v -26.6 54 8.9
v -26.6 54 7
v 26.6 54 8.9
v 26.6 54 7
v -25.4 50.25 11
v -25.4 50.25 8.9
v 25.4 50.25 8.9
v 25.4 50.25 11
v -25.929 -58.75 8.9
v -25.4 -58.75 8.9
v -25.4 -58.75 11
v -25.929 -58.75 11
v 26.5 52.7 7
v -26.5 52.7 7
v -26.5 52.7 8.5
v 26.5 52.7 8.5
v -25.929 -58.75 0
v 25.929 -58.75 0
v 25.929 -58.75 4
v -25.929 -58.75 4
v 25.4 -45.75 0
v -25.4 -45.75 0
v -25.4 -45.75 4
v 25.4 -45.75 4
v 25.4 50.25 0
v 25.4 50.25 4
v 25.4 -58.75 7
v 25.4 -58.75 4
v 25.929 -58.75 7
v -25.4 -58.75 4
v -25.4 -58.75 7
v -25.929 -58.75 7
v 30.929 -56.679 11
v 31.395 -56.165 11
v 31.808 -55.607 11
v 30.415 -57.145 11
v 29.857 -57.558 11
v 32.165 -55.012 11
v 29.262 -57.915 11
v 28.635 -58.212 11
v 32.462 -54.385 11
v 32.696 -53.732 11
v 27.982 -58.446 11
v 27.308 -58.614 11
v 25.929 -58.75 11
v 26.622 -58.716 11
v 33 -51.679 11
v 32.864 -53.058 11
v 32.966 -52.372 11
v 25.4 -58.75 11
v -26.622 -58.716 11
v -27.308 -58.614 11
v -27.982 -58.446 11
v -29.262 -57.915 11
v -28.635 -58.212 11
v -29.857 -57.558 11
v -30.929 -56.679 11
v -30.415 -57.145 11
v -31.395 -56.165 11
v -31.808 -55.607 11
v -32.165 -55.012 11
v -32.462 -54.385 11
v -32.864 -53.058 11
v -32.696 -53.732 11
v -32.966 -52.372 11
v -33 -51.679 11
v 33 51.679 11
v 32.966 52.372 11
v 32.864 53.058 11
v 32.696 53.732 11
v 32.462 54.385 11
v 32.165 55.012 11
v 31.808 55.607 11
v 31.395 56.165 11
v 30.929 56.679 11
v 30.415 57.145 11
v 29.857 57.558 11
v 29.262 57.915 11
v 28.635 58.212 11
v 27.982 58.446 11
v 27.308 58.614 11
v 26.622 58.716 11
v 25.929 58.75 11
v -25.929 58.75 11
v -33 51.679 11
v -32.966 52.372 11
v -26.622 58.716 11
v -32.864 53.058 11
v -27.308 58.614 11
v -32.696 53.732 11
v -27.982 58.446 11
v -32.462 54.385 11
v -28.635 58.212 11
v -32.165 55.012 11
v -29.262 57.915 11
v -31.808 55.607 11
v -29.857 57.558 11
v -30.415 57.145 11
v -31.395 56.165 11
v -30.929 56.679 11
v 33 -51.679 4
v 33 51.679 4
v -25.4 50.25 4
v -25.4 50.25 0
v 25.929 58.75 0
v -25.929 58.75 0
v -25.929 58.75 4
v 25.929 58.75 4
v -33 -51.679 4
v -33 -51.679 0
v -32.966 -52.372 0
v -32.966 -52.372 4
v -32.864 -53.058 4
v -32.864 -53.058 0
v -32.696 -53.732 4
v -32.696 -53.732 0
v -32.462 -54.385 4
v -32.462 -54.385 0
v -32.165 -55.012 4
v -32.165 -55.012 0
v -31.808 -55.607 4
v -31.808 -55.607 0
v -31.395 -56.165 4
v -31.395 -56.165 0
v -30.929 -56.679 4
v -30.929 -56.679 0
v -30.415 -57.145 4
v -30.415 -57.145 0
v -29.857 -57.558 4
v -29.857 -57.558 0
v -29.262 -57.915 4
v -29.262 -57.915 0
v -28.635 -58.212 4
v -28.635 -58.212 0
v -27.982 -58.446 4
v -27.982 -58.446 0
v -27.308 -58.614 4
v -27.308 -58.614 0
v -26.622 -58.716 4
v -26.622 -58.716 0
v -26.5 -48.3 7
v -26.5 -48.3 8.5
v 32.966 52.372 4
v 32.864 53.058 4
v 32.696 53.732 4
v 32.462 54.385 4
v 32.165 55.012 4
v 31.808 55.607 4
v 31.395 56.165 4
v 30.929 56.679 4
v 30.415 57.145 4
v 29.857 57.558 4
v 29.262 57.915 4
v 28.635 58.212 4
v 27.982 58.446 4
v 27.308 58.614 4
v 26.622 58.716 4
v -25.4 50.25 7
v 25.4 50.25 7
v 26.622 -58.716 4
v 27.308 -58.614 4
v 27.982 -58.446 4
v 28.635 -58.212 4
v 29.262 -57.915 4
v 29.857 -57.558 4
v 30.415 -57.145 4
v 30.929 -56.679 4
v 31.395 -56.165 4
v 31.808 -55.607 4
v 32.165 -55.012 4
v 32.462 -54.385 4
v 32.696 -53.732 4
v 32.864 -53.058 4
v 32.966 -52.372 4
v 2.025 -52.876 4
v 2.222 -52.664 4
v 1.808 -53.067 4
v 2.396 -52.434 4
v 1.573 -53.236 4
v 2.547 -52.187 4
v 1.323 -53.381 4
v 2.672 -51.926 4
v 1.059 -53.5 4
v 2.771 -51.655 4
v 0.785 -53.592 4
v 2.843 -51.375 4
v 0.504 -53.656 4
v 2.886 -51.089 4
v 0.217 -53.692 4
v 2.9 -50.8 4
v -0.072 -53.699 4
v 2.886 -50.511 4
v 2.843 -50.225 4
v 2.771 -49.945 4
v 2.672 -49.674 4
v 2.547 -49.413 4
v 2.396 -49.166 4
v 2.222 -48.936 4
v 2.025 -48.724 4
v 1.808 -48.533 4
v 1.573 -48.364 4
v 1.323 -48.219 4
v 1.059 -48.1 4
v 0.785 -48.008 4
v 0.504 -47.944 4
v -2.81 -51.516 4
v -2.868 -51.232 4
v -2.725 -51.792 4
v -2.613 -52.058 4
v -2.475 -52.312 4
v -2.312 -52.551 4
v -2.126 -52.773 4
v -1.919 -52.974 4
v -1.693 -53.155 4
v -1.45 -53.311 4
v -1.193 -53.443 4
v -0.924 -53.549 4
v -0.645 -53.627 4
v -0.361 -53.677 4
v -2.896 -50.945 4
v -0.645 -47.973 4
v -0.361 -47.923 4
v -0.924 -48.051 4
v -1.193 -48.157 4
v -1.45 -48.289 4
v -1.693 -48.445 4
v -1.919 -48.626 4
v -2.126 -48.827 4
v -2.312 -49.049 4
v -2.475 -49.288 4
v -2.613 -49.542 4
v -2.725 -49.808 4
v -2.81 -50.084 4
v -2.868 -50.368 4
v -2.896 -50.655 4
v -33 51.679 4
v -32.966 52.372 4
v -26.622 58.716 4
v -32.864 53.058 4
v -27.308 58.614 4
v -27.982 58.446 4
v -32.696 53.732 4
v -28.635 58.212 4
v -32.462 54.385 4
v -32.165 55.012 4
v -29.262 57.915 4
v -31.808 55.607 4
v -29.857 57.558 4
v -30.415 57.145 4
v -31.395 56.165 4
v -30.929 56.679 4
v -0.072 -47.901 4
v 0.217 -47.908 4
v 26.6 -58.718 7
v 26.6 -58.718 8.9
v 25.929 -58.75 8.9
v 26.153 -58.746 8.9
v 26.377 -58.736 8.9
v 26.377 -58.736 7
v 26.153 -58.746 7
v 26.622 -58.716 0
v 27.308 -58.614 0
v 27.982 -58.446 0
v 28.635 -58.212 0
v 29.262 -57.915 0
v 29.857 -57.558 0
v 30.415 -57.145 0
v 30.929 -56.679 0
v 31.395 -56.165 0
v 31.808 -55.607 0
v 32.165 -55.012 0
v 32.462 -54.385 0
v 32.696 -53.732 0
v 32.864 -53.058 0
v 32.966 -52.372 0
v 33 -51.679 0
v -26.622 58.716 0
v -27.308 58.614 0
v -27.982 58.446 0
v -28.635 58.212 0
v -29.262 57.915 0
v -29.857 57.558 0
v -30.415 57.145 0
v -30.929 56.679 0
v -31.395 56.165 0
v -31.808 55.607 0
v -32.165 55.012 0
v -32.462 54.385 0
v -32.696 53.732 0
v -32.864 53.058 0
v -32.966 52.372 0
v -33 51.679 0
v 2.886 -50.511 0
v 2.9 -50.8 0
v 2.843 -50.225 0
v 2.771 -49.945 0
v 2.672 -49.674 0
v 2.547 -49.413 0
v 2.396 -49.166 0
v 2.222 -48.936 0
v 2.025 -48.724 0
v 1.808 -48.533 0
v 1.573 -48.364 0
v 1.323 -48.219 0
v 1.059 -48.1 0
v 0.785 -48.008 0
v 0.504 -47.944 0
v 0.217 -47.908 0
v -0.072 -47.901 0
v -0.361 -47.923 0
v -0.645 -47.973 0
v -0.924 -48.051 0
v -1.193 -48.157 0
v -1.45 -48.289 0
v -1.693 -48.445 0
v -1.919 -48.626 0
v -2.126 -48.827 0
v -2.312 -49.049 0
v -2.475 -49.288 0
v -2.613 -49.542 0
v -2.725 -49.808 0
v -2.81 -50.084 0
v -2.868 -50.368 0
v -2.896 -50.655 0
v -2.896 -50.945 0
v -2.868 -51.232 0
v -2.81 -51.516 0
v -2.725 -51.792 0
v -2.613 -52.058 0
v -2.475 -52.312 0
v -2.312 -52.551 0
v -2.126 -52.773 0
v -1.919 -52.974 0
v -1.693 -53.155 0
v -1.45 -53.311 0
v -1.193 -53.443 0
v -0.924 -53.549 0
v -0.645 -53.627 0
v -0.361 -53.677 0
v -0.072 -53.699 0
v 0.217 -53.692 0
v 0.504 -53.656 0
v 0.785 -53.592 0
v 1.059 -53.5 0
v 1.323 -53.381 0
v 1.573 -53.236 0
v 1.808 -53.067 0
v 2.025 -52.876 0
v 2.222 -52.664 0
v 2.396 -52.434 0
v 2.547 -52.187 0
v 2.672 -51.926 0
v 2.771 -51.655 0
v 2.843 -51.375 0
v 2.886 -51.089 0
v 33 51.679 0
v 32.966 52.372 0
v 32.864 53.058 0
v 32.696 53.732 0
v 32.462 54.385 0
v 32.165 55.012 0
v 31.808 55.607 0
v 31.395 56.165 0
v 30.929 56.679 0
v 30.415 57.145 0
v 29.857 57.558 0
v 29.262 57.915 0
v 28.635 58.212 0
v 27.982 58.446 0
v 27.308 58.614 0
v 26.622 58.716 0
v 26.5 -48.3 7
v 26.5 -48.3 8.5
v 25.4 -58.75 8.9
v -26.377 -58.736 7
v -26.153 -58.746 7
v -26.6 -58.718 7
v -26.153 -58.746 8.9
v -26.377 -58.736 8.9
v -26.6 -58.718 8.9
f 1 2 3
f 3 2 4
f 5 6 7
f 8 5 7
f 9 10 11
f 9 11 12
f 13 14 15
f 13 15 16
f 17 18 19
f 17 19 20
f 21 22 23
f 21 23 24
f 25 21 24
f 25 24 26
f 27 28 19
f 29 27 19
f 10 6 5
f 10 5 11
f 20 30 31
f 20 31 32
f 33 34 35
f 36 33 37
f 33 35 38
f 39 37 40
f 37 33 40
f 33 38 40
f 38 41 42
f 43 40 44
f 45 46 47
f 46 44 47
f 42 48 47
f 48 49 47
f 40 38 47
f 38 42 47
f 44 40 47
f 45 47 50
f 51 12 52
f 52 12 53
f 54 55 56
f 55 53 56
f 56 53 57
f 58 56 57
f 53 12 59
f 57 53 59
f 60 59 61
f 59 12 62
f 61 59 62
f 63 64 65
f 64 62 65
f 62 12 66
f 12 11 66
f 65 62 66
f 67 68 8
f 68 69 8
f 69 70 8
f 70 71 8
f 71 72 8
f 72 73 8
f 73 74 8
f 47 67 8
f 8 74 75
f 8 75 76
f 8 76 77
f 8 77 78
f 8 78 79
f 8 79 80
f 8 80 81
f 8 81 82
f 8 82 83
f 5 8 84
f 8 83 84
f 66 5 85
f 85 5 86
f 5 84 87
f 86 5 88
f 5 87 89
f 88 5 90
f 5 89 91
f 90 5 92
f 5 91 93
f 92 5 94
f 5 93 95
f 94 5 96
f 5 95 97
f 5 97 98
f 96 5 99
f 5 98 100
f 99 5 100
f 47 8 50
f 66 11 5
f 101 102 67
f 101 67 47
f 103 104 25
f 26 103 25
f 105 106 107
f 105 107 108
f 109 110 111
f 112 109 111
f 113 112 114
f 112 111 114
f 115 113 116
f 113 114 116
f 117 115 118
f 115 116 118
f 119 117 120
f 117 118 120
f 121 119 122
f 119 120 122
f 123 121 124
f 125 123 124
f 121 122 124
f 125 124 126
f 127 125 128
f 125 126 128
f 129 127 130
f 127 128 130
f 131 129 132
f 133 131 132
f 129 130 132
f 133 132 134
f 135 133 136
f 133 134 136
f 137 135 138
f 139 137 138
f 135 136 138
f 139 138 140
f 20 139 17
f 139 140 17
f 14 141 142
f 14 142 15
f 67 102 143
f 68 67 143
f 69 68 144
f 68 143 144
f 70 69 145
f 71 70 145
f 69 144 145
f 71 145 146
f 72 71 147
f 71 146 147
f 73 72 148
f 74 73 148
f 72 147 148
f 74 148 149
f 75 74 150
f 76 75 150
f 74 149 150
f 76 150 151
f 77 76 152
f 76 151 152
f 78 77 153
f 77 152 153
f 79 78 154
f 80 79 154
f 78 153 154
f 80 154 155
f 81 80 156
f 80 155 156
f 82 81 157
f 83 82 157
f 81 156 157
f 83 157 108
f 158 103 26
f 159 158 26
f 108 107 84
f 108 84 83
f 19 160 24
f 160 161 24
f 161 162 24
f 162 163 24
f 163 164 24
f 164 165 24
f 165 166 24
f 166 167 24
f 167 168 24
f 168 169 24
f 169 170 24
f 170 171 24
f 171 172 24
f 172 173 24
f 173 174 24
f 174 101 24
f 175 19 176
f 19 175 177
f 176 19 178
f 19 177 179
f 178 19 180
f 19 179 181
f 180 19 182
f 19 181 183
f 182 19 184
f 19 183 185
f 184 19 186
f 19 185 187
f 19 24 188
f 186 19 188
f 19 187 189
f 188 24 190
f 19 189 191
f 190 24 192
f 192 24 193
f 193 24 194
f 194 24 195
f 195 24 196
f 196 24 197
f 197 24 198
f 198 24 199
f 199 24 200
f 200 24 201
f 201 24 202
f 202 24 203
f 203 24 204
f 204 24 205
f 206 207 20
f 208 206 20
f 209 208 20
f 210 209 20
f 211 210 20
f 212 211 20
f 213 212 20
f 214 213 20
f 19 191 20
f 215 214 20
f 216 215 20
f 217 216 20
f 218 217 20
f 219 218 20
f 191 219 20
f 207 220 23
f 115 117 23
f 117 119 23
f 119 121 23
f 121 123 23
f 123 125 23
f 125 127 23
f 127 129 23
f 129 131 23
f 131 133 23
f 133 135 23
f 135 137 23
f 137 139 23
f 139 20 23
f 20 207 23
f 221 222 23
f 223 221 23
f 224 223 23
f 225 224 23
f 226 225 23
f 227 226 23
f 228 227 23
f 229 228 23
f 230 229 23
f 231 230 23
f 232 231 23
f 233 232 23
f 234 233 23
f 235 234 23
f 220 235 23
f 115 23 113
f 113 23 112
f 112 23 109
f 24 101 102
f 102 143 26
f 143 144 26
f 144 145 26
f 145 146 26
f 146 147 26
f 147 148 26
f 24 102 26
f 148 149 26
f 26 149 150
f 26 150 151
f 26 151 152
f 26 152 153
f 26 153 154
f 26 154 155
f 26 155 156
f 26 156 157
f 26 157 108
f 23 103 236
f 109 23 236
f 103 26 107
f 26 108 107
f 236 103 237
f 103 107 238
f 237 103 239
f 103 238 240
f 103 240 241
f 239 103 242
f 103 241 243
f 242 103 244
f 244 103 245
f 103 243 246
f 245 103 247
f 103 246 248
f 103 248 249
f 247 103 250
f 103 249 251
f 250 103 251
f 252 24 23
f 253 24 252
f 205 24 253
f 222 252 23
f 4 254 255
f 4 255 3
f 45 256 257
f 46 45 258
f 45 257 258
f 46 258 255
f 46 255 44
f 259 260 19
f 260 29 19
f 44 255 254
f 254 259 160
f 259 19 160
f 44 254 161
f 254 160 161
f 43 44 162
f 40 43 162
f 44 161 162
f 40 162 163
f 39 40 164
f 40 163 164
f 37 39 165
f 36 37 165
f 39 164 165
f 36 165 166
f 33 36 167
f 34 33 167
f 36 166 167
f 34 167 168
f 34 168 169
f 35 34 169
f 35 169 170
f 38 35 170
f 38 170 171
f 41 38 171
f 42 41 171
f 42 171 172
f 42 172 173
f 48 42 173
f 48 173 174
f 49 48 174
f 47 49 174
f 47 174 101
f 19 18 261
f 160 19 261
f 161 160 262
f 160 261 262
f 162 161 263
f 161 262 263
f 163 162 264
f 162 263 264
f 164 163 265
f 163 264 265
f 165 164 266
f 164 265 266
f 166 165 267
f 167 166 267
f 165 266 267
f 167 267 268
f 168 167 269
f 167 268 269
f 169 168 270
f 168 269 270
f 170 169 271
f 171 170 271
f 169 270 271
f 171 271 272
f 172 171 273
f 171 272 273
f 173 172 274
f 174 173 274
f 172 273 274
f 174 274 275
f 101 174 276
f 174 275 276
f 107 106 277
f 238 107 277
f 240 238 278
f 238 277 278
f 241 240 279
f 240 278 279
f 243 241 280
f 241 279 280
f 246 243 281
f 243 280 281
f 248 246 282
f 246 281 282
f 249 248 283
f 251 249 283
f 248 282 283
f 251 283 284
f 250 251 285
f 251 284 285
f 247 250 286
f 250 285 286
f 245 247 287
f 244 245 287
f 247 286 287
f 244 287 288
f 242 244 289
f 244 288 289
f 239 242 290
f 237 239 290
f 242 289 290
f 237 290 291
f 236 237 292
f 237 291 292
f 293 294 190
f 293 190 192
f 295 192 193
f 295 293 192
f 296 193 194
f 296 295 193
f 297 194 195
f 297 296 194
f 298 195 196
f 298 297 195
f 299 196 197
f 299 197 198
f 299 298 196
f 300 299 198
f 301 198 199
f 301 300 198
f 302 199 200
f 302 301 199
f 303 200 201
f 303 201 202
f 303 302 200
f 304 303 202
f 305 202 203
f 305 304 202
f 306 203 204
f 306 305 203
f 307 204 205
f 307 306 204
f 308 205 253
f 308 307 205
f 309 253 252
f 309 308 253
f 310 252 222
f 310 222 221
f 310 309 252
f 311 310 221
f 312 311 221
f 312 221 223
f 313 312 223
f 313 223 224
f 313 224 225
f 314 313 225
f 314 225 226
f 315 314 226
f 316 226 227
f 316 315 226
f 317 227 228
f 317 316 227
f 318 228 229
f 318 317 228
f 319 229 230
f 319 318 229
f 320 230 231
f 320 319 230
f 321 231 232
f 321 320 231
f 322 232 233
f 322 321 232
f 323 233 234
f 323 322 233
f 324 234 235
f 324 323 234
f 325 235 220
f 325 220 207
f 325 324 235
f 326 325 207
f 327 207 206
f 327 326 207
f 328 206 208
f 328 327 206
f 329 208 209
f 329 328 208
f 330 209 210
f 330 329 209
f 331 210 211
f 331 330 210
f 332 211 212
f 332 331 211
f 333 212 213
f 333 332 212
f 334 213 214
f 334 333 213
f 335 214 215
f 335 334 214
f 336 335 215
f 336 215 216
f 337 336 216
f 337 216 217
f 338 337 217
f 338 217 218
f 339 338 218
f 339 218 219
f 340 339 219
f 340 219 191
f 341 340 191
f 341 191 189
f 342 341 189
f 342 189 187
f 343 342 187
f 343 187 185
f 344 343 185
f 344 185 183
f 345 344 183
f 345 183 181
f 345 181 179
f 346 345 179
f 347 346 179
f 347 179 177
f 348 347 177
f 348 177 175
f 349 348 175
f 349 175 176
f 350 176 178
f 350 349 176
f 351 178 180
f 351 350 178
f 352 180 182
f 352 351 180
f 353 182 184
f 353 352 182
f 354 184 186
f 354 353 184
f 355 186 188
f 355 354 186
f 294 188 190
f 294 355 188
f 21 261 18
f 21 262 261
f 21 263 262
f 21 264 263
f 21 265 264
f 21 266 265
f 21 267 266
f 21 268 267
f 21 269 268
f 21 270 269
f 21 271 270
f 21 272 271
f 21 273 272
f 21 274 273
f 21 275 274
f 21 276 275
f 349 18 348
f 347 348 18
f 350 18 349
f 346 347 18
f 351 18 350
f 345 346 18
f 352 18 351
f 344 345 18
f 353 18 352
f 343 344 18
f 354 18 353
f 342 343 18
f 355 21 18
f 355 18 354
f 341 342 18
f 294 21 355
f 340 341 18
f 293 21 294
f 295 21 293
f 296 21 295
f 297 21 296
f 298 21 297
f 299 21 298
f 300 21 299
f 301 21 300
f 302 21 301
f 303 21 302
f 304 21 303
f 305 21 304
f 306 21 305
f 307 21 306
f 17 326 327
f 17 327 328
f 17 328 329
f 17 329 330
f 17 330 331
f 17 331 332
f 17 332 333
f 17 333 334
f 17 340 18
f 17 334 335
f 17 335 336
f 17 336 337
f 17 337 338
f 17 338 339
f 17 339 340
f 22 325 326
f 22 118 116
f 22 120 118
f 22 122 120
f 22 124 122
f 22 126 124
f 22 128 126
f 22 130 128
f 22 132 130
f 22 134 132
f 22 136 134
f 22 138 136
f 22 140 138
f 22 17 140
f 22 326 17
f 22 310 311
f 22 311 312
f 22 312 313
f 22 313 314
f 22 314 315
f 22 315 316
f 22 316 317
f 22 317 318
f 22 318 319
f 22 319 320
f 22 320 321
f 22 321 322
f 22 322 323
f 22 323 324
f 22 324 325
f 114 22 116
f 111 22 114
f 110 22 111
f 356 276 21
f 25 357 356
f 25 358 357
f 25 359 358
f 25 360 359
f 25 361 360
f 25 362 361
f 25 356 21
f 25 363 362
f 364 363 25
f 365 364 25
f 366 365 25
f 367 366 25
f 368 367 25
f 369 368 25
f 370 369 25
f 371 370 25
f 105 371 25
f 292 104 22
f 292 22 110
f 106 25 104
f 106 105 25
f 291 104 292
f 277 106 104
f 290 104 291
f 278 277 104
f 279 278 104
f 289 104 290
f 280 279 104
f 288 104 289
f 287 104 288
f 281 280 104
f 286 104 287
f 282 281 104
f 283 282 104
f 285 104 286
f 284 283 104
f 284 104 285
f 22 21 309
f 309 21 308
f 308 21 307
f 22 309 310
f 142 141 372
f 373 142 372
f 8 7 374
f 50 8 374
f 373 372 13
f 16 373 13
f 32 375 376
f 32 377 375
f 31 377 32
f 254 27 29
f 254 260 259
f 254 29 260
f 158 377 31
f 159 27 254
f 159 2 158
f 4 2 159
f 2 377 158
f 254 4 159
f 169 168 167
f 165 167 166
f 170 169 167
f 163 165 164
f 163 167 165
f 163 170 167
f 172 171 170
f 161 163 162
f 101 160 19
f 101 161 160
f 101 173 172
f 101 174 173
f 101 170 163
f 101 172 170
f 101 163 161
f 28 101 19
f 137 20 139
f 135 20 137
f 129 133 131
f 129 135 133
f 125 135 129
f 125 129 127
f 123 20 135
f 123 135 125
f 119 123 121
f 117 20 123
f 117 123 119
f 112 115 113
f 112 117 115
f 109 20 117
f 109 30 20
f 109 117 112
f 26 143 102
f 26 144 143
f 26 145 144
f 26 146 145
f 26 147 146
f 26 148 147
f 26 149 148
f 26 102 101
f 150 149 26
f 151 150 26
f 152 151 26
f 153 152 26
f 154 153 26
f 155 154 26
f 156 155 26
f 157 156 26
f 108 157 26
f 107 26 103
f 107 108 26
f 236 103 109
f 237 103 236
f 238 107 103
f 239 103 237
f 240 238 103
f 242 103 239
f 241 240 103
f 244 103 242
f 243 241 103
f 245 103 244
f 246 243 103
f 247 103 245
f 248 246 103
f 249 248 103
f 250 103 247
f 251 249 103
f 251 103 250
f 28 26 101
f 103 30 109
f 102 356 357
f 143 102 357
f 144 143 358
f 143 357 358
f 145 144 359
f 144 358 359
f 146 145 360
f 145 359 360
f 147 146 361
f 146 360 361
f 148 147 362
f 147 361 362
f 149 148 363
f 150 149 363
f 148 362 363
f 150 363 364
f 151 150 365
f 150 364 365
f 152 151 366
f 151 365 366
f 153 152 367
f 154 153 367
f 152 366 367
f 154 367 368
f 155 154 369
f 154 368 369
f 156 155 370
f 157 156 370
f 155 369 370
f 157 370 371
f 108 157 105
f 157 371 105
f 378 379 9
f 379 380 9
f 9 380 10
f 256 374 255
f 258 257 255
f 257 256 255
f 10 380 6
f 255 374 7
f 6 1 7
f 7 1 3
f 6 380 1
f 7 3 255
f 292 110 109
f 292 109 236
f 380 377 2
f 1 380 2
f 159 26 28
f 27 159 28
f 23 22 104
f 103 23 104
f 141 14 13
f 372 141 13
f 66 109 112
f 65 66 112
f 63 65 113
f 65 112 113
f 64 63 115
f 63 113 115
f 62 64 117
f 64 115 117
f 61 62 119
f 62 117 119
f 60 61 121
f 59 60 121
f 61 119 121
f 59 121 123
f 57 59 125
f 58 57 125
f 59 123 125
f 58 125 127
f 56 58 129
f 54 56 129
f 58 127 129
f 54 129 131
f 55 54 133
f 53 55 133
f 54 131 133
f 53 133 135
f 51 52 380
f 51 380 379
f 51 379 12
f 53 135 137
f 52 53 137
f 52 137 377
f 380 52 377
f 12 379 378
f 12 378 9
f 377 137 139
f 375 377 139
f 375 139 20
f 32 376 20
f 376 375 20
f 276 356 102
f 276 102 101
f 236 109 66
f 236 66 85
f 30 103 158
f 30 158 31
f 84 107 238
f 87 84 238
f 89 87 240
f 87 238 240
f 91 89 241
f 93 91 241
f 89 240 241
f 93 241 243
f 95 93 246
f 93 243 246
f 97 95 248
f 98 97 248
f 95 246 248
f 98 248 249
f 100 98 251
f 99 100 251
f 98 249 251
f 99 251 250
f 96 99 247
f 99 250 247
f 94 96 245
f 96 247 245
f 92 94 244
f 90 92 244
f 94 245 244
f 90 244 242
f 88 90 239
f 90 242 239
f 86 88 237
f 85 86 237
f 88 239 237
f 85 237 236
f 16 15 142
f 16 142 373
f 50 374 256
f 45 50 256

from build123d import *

# Parameters (mm, degrees)
SKETCH001_R  = 2.9
SKETCH001_W  = 50.8
SKETCH001_H  = 96
PAD001_DEPTH = 4
SKETCH_W     = 53.2
SKETCH_H     = 114
PAD_DEPTH    = 1.9
PAD002_DEPTH = 7
SKETCH004_W  = 53
SKETCH004_H  = 101
PAD004_DEPTH = 1.5


with BuildPart() as pad001:
    # Sketch001 → Pad001 (new body)
    with BuildSketch(Plane.XY):
        with BuildLine():
            Line((-25.928932, 58.75), (25.928932, 58.75))
            ThreePointArc((33, 51.678932), (30.928932, 56.678932), (25.928932, 58.75))
            Line((33, 51.678932), (33, -51.678932))
            ThreePointArc((25.928932, -58.75), (30.928932, -56.678932), (33, -51.678932))
            Line((25.928932, -58.75), (-25.928932, -58.75))
            ThreePointArc((-33, -51.678932), (-30.928932, -56.678932), (-25.928932, -58.75))
            Line((-33, -51.678932), (-33, 51.678932))
            ThreePointArc((-25.928932, 58.75), (-30.928932, 56.678932), (-33, 51.678932))
        make_face()
        with Locations((0, -50.8)):
            Circle(SKETCH001_R, mode=Mode.SUBTRACT)
        with Locations((0, 2.25)):
            Rectangle(SKETCH001_W, SKETCH001_H, mode=Mode.SUBTRACT)
    extrude(amount=PAD001_DEPTH)


with BuildPart() as pad:
    # Sketch → Pad (new body)
    with BuildSketch(Plane.XY.offset(7)):
        with Locations((0, -3)):
            Rectangle(SKETCH_W, SKETCH_H)
    extrude(amount=PAD_DEPTH)


with BuildPart() as cut:
    # Sketch002 → Pad002 (new body)
    with BuildSketch(Plane.XY.offset(4)):
        with BuildLine():
            Line((-25.928932, 58.75), (25.928932, 58.75))
            ThreePointArc((33, 51.678932), (30.928932, 56.678932), (25.928932, 58.75))
            Line((33, 51.678932), (33, -51.678932))
            ThreePointArc((25.928932, -58.75), (30.928932, -56.678932), (33, -51.678932))
            Line((25.4, -58.75), (25.928932, -58.75))
            Line((25.4, 50.25), (25.4, -58.75))
            Line((-25.4, 50.25), (25.4, 50.25))
            Line((-25.4, 50.25), (-25.4, -58.75))
            Line((-25.4, -58.75), (-25.928933, -58.75))
            ThreePointArc((-33, -51.678931), (-30.928933, -56.678931), (-25.928933, -58.75))
            Line((-33, -51.678931), (-33, 51.678932))
            ThreePointArc((-25.928932, 58.75), (-30.928932, 56.678932), (-33, 51.678932))
        make_face()
    extrude(amount=PAD002_DEPTH)

    # Cut: cut Pad
    add(pad.part, mode=Mode.SUBTRACT)


with BuildPart() as pad004:
    # Sketch004 → Pad004 (new body)
    with BuildSketch(Plane.XY.offset(7)):
        with Locations((0, 2.2)):
            Rectangle(SKETCH004_W, SKETCH004_H)
    extrude(amount=PAD004_DEPTH)


solid = Compound([pad001.part, cut.part, pad004.part])
